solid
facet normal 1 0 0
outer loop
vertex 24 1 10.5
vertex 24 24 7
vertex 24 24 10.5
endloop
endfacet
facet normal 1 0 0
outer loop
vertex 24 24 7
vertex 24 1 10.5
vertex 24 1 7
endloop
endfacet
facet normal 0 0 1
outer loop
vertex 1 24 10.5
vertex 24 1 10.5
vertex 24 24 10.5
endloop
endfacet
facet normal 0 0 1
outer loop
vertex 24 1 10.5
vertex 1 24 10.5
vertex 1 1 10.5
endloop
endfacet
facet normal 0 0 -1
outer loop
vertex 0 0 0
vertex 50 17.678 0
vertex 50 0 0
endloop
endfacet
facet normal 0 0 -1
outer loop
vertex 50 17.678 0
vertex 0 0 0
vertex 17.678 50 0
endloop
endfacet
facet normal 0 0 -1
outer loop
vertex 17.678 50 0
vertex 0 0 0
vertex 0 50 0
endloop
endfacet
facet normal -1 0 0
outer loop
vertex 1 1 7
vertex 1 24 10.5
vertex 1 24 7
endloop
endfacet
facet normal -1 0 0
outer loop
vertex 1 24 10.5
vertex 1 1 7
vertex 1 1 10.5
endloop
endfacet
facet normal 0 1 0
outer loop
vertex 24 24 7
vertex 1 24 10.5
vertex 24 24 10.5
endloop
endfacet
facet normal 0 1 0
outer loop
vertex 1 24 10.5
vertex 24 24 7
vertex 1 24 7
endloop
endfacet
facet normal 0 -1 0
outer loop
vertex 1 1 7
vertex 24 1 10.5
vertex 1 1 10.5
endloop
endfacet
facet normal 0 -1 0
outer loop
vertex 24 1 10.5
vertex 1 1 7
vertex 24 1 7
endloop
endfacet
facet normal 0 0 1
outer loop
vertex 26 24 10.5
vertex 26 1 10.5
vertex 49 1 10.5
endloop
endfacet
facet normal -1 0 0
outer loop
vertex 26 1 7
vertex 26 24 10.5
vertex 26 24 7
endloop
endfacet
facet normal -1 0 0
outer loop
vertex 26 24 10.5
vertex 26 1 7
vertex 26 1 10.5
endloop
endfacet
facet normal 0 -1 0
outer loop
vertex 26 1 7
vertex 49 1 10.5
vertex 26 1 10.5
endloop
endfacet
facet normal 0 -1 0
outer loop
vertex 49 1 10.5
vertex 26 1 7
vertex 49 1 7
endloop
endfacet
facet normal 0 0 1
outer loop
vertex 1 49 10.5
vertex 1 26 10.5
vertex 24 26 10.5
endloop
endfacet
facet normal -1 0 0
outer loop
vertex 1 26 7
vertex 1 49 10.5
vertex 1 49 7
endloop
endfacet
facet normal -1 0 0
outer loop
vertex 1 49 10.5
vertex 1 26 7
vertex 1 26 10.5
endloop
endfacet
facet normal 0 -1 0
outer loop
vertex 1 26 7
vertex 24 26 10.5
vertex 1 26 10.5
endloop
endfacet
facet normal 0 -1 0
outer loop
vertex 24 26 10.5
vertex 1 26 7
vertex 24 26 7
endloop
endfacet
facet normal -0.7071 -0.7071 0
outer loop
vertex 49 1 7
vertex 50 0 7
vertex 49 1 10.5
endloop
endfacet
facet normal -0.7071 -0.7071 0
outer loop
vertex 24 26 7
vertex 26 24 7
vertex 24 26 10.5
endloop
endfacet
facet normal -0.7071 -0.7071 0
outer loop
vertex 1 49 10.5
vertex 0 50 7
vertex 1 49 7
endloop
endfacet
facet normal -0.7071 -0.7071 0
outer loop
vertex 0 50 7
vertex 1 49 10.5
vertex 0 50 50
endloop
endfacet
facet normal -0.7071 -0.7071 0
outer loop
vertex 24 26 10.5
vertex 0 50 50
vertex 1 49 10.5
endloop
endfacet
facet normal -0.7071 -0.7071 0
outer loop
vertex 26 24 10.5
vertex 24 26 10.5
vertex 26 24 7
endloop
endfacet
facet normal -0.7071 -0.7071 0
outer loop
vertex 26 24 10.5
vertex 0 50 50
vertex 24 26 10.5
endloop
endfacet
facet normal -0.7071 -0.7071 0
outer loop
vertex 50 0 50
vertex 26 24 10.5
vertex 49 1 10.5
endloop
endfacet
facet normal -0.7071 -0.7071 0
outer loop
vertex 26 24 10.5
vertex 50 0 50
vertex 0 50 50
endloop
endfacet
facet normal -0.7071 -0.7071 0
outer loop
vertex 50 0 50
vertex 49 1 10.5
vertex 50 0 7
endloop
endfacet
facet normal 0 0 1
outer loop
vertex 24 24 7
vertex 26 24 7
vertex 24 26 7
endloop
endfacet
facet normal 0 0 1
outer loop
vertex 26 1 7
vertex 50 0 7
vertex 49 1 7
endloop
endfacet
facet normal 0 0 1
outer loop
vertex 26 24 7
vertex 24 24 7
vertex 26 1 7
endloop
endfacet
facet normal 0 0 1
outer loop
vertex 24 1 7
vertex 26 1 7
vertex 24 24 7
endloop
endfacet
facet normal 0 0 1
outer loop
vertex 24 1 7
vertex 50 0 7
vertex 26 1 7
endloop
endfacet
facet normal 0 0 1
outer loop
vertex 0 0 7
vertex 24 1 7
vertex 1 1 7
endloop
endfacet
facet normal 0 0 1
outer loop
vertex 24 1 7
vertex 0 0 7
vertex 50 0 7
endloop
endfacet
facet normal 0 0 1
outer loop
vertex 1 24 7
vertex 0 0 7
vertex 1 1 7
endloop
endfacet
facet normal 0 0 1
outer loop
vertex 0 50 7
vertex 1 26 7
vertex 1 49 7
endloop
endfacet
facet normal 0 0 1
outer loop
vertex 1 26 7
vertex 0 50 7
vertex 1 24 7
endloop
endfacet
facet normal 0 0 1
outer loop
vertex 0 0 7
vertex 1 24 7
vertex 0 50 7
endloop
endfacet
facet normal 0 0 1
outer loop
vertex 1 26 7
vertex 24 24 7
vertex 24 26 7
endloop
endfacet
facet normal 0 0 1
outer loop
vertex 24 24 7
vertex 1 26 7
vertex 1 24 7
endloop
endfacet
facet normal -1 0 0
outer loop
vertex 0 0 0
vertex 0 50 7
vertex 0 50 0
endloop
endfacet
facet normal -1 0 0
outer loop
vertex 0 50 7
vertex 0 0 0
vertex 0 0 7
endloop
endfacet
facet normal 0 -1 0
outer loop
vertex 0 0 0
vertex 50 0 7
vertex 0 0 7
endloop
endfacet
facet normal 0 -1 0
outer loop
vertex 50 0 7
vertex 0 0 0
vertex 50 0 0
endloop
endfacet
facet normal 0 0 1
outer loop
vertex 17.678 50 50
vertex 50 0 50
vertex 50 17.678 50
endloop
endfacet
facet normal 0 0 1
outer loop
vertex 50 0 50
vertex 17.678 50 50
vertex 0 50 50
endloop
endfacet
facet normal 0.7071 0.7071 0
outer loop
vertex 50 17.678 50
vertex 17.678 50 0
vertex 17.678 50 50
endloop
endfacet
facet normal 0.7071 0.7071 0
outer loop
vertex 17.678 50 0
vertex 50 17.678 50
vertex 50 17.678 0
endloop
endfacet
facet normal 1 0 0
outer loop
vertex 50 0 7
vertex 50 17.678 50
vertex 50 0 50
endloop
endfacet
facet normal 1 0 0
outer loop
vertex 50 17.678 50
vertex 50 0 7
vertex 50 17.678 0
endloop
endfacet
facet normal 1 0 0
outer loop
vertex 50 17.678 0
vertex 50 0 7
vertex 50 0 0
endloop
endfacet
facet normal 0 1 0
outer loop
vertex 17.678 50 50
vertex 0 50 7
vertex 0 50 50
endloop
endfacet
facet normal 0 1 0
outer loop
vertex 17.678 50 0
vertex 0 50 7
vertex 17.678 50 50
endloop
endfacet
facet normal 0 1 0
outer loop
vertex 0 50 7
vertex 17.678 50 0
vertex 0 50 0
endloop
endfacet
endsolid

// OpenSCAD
color("LightGray") {
    intersection() {
        union() {
            translate([1,1,0]) cube([23,23,6+4.5]);
            translate([25+1,1,0]) cube([23,23,6+4.5]);
            translate([1,25+1,0]) cube([23,23,6+4.5]);
            translate([25+1,25+1,0]) cube([23,23,6+4.5]);
        }
        translate([50,0,0]) rotate([0,0,90+45]) cube([75,75,75]);
    }
}

color("Grey") {
    intersection() {
        cube([50,50,7]);
        translate([50,0,0]) rotate([0,0,90+45]) cube([75,75,75]);
    }
    intersection() {
        translate([50,0,0]) rotate([0,0,45]) cube([12.5,75,50]);
        cube([50,50,50]);
    }
}
